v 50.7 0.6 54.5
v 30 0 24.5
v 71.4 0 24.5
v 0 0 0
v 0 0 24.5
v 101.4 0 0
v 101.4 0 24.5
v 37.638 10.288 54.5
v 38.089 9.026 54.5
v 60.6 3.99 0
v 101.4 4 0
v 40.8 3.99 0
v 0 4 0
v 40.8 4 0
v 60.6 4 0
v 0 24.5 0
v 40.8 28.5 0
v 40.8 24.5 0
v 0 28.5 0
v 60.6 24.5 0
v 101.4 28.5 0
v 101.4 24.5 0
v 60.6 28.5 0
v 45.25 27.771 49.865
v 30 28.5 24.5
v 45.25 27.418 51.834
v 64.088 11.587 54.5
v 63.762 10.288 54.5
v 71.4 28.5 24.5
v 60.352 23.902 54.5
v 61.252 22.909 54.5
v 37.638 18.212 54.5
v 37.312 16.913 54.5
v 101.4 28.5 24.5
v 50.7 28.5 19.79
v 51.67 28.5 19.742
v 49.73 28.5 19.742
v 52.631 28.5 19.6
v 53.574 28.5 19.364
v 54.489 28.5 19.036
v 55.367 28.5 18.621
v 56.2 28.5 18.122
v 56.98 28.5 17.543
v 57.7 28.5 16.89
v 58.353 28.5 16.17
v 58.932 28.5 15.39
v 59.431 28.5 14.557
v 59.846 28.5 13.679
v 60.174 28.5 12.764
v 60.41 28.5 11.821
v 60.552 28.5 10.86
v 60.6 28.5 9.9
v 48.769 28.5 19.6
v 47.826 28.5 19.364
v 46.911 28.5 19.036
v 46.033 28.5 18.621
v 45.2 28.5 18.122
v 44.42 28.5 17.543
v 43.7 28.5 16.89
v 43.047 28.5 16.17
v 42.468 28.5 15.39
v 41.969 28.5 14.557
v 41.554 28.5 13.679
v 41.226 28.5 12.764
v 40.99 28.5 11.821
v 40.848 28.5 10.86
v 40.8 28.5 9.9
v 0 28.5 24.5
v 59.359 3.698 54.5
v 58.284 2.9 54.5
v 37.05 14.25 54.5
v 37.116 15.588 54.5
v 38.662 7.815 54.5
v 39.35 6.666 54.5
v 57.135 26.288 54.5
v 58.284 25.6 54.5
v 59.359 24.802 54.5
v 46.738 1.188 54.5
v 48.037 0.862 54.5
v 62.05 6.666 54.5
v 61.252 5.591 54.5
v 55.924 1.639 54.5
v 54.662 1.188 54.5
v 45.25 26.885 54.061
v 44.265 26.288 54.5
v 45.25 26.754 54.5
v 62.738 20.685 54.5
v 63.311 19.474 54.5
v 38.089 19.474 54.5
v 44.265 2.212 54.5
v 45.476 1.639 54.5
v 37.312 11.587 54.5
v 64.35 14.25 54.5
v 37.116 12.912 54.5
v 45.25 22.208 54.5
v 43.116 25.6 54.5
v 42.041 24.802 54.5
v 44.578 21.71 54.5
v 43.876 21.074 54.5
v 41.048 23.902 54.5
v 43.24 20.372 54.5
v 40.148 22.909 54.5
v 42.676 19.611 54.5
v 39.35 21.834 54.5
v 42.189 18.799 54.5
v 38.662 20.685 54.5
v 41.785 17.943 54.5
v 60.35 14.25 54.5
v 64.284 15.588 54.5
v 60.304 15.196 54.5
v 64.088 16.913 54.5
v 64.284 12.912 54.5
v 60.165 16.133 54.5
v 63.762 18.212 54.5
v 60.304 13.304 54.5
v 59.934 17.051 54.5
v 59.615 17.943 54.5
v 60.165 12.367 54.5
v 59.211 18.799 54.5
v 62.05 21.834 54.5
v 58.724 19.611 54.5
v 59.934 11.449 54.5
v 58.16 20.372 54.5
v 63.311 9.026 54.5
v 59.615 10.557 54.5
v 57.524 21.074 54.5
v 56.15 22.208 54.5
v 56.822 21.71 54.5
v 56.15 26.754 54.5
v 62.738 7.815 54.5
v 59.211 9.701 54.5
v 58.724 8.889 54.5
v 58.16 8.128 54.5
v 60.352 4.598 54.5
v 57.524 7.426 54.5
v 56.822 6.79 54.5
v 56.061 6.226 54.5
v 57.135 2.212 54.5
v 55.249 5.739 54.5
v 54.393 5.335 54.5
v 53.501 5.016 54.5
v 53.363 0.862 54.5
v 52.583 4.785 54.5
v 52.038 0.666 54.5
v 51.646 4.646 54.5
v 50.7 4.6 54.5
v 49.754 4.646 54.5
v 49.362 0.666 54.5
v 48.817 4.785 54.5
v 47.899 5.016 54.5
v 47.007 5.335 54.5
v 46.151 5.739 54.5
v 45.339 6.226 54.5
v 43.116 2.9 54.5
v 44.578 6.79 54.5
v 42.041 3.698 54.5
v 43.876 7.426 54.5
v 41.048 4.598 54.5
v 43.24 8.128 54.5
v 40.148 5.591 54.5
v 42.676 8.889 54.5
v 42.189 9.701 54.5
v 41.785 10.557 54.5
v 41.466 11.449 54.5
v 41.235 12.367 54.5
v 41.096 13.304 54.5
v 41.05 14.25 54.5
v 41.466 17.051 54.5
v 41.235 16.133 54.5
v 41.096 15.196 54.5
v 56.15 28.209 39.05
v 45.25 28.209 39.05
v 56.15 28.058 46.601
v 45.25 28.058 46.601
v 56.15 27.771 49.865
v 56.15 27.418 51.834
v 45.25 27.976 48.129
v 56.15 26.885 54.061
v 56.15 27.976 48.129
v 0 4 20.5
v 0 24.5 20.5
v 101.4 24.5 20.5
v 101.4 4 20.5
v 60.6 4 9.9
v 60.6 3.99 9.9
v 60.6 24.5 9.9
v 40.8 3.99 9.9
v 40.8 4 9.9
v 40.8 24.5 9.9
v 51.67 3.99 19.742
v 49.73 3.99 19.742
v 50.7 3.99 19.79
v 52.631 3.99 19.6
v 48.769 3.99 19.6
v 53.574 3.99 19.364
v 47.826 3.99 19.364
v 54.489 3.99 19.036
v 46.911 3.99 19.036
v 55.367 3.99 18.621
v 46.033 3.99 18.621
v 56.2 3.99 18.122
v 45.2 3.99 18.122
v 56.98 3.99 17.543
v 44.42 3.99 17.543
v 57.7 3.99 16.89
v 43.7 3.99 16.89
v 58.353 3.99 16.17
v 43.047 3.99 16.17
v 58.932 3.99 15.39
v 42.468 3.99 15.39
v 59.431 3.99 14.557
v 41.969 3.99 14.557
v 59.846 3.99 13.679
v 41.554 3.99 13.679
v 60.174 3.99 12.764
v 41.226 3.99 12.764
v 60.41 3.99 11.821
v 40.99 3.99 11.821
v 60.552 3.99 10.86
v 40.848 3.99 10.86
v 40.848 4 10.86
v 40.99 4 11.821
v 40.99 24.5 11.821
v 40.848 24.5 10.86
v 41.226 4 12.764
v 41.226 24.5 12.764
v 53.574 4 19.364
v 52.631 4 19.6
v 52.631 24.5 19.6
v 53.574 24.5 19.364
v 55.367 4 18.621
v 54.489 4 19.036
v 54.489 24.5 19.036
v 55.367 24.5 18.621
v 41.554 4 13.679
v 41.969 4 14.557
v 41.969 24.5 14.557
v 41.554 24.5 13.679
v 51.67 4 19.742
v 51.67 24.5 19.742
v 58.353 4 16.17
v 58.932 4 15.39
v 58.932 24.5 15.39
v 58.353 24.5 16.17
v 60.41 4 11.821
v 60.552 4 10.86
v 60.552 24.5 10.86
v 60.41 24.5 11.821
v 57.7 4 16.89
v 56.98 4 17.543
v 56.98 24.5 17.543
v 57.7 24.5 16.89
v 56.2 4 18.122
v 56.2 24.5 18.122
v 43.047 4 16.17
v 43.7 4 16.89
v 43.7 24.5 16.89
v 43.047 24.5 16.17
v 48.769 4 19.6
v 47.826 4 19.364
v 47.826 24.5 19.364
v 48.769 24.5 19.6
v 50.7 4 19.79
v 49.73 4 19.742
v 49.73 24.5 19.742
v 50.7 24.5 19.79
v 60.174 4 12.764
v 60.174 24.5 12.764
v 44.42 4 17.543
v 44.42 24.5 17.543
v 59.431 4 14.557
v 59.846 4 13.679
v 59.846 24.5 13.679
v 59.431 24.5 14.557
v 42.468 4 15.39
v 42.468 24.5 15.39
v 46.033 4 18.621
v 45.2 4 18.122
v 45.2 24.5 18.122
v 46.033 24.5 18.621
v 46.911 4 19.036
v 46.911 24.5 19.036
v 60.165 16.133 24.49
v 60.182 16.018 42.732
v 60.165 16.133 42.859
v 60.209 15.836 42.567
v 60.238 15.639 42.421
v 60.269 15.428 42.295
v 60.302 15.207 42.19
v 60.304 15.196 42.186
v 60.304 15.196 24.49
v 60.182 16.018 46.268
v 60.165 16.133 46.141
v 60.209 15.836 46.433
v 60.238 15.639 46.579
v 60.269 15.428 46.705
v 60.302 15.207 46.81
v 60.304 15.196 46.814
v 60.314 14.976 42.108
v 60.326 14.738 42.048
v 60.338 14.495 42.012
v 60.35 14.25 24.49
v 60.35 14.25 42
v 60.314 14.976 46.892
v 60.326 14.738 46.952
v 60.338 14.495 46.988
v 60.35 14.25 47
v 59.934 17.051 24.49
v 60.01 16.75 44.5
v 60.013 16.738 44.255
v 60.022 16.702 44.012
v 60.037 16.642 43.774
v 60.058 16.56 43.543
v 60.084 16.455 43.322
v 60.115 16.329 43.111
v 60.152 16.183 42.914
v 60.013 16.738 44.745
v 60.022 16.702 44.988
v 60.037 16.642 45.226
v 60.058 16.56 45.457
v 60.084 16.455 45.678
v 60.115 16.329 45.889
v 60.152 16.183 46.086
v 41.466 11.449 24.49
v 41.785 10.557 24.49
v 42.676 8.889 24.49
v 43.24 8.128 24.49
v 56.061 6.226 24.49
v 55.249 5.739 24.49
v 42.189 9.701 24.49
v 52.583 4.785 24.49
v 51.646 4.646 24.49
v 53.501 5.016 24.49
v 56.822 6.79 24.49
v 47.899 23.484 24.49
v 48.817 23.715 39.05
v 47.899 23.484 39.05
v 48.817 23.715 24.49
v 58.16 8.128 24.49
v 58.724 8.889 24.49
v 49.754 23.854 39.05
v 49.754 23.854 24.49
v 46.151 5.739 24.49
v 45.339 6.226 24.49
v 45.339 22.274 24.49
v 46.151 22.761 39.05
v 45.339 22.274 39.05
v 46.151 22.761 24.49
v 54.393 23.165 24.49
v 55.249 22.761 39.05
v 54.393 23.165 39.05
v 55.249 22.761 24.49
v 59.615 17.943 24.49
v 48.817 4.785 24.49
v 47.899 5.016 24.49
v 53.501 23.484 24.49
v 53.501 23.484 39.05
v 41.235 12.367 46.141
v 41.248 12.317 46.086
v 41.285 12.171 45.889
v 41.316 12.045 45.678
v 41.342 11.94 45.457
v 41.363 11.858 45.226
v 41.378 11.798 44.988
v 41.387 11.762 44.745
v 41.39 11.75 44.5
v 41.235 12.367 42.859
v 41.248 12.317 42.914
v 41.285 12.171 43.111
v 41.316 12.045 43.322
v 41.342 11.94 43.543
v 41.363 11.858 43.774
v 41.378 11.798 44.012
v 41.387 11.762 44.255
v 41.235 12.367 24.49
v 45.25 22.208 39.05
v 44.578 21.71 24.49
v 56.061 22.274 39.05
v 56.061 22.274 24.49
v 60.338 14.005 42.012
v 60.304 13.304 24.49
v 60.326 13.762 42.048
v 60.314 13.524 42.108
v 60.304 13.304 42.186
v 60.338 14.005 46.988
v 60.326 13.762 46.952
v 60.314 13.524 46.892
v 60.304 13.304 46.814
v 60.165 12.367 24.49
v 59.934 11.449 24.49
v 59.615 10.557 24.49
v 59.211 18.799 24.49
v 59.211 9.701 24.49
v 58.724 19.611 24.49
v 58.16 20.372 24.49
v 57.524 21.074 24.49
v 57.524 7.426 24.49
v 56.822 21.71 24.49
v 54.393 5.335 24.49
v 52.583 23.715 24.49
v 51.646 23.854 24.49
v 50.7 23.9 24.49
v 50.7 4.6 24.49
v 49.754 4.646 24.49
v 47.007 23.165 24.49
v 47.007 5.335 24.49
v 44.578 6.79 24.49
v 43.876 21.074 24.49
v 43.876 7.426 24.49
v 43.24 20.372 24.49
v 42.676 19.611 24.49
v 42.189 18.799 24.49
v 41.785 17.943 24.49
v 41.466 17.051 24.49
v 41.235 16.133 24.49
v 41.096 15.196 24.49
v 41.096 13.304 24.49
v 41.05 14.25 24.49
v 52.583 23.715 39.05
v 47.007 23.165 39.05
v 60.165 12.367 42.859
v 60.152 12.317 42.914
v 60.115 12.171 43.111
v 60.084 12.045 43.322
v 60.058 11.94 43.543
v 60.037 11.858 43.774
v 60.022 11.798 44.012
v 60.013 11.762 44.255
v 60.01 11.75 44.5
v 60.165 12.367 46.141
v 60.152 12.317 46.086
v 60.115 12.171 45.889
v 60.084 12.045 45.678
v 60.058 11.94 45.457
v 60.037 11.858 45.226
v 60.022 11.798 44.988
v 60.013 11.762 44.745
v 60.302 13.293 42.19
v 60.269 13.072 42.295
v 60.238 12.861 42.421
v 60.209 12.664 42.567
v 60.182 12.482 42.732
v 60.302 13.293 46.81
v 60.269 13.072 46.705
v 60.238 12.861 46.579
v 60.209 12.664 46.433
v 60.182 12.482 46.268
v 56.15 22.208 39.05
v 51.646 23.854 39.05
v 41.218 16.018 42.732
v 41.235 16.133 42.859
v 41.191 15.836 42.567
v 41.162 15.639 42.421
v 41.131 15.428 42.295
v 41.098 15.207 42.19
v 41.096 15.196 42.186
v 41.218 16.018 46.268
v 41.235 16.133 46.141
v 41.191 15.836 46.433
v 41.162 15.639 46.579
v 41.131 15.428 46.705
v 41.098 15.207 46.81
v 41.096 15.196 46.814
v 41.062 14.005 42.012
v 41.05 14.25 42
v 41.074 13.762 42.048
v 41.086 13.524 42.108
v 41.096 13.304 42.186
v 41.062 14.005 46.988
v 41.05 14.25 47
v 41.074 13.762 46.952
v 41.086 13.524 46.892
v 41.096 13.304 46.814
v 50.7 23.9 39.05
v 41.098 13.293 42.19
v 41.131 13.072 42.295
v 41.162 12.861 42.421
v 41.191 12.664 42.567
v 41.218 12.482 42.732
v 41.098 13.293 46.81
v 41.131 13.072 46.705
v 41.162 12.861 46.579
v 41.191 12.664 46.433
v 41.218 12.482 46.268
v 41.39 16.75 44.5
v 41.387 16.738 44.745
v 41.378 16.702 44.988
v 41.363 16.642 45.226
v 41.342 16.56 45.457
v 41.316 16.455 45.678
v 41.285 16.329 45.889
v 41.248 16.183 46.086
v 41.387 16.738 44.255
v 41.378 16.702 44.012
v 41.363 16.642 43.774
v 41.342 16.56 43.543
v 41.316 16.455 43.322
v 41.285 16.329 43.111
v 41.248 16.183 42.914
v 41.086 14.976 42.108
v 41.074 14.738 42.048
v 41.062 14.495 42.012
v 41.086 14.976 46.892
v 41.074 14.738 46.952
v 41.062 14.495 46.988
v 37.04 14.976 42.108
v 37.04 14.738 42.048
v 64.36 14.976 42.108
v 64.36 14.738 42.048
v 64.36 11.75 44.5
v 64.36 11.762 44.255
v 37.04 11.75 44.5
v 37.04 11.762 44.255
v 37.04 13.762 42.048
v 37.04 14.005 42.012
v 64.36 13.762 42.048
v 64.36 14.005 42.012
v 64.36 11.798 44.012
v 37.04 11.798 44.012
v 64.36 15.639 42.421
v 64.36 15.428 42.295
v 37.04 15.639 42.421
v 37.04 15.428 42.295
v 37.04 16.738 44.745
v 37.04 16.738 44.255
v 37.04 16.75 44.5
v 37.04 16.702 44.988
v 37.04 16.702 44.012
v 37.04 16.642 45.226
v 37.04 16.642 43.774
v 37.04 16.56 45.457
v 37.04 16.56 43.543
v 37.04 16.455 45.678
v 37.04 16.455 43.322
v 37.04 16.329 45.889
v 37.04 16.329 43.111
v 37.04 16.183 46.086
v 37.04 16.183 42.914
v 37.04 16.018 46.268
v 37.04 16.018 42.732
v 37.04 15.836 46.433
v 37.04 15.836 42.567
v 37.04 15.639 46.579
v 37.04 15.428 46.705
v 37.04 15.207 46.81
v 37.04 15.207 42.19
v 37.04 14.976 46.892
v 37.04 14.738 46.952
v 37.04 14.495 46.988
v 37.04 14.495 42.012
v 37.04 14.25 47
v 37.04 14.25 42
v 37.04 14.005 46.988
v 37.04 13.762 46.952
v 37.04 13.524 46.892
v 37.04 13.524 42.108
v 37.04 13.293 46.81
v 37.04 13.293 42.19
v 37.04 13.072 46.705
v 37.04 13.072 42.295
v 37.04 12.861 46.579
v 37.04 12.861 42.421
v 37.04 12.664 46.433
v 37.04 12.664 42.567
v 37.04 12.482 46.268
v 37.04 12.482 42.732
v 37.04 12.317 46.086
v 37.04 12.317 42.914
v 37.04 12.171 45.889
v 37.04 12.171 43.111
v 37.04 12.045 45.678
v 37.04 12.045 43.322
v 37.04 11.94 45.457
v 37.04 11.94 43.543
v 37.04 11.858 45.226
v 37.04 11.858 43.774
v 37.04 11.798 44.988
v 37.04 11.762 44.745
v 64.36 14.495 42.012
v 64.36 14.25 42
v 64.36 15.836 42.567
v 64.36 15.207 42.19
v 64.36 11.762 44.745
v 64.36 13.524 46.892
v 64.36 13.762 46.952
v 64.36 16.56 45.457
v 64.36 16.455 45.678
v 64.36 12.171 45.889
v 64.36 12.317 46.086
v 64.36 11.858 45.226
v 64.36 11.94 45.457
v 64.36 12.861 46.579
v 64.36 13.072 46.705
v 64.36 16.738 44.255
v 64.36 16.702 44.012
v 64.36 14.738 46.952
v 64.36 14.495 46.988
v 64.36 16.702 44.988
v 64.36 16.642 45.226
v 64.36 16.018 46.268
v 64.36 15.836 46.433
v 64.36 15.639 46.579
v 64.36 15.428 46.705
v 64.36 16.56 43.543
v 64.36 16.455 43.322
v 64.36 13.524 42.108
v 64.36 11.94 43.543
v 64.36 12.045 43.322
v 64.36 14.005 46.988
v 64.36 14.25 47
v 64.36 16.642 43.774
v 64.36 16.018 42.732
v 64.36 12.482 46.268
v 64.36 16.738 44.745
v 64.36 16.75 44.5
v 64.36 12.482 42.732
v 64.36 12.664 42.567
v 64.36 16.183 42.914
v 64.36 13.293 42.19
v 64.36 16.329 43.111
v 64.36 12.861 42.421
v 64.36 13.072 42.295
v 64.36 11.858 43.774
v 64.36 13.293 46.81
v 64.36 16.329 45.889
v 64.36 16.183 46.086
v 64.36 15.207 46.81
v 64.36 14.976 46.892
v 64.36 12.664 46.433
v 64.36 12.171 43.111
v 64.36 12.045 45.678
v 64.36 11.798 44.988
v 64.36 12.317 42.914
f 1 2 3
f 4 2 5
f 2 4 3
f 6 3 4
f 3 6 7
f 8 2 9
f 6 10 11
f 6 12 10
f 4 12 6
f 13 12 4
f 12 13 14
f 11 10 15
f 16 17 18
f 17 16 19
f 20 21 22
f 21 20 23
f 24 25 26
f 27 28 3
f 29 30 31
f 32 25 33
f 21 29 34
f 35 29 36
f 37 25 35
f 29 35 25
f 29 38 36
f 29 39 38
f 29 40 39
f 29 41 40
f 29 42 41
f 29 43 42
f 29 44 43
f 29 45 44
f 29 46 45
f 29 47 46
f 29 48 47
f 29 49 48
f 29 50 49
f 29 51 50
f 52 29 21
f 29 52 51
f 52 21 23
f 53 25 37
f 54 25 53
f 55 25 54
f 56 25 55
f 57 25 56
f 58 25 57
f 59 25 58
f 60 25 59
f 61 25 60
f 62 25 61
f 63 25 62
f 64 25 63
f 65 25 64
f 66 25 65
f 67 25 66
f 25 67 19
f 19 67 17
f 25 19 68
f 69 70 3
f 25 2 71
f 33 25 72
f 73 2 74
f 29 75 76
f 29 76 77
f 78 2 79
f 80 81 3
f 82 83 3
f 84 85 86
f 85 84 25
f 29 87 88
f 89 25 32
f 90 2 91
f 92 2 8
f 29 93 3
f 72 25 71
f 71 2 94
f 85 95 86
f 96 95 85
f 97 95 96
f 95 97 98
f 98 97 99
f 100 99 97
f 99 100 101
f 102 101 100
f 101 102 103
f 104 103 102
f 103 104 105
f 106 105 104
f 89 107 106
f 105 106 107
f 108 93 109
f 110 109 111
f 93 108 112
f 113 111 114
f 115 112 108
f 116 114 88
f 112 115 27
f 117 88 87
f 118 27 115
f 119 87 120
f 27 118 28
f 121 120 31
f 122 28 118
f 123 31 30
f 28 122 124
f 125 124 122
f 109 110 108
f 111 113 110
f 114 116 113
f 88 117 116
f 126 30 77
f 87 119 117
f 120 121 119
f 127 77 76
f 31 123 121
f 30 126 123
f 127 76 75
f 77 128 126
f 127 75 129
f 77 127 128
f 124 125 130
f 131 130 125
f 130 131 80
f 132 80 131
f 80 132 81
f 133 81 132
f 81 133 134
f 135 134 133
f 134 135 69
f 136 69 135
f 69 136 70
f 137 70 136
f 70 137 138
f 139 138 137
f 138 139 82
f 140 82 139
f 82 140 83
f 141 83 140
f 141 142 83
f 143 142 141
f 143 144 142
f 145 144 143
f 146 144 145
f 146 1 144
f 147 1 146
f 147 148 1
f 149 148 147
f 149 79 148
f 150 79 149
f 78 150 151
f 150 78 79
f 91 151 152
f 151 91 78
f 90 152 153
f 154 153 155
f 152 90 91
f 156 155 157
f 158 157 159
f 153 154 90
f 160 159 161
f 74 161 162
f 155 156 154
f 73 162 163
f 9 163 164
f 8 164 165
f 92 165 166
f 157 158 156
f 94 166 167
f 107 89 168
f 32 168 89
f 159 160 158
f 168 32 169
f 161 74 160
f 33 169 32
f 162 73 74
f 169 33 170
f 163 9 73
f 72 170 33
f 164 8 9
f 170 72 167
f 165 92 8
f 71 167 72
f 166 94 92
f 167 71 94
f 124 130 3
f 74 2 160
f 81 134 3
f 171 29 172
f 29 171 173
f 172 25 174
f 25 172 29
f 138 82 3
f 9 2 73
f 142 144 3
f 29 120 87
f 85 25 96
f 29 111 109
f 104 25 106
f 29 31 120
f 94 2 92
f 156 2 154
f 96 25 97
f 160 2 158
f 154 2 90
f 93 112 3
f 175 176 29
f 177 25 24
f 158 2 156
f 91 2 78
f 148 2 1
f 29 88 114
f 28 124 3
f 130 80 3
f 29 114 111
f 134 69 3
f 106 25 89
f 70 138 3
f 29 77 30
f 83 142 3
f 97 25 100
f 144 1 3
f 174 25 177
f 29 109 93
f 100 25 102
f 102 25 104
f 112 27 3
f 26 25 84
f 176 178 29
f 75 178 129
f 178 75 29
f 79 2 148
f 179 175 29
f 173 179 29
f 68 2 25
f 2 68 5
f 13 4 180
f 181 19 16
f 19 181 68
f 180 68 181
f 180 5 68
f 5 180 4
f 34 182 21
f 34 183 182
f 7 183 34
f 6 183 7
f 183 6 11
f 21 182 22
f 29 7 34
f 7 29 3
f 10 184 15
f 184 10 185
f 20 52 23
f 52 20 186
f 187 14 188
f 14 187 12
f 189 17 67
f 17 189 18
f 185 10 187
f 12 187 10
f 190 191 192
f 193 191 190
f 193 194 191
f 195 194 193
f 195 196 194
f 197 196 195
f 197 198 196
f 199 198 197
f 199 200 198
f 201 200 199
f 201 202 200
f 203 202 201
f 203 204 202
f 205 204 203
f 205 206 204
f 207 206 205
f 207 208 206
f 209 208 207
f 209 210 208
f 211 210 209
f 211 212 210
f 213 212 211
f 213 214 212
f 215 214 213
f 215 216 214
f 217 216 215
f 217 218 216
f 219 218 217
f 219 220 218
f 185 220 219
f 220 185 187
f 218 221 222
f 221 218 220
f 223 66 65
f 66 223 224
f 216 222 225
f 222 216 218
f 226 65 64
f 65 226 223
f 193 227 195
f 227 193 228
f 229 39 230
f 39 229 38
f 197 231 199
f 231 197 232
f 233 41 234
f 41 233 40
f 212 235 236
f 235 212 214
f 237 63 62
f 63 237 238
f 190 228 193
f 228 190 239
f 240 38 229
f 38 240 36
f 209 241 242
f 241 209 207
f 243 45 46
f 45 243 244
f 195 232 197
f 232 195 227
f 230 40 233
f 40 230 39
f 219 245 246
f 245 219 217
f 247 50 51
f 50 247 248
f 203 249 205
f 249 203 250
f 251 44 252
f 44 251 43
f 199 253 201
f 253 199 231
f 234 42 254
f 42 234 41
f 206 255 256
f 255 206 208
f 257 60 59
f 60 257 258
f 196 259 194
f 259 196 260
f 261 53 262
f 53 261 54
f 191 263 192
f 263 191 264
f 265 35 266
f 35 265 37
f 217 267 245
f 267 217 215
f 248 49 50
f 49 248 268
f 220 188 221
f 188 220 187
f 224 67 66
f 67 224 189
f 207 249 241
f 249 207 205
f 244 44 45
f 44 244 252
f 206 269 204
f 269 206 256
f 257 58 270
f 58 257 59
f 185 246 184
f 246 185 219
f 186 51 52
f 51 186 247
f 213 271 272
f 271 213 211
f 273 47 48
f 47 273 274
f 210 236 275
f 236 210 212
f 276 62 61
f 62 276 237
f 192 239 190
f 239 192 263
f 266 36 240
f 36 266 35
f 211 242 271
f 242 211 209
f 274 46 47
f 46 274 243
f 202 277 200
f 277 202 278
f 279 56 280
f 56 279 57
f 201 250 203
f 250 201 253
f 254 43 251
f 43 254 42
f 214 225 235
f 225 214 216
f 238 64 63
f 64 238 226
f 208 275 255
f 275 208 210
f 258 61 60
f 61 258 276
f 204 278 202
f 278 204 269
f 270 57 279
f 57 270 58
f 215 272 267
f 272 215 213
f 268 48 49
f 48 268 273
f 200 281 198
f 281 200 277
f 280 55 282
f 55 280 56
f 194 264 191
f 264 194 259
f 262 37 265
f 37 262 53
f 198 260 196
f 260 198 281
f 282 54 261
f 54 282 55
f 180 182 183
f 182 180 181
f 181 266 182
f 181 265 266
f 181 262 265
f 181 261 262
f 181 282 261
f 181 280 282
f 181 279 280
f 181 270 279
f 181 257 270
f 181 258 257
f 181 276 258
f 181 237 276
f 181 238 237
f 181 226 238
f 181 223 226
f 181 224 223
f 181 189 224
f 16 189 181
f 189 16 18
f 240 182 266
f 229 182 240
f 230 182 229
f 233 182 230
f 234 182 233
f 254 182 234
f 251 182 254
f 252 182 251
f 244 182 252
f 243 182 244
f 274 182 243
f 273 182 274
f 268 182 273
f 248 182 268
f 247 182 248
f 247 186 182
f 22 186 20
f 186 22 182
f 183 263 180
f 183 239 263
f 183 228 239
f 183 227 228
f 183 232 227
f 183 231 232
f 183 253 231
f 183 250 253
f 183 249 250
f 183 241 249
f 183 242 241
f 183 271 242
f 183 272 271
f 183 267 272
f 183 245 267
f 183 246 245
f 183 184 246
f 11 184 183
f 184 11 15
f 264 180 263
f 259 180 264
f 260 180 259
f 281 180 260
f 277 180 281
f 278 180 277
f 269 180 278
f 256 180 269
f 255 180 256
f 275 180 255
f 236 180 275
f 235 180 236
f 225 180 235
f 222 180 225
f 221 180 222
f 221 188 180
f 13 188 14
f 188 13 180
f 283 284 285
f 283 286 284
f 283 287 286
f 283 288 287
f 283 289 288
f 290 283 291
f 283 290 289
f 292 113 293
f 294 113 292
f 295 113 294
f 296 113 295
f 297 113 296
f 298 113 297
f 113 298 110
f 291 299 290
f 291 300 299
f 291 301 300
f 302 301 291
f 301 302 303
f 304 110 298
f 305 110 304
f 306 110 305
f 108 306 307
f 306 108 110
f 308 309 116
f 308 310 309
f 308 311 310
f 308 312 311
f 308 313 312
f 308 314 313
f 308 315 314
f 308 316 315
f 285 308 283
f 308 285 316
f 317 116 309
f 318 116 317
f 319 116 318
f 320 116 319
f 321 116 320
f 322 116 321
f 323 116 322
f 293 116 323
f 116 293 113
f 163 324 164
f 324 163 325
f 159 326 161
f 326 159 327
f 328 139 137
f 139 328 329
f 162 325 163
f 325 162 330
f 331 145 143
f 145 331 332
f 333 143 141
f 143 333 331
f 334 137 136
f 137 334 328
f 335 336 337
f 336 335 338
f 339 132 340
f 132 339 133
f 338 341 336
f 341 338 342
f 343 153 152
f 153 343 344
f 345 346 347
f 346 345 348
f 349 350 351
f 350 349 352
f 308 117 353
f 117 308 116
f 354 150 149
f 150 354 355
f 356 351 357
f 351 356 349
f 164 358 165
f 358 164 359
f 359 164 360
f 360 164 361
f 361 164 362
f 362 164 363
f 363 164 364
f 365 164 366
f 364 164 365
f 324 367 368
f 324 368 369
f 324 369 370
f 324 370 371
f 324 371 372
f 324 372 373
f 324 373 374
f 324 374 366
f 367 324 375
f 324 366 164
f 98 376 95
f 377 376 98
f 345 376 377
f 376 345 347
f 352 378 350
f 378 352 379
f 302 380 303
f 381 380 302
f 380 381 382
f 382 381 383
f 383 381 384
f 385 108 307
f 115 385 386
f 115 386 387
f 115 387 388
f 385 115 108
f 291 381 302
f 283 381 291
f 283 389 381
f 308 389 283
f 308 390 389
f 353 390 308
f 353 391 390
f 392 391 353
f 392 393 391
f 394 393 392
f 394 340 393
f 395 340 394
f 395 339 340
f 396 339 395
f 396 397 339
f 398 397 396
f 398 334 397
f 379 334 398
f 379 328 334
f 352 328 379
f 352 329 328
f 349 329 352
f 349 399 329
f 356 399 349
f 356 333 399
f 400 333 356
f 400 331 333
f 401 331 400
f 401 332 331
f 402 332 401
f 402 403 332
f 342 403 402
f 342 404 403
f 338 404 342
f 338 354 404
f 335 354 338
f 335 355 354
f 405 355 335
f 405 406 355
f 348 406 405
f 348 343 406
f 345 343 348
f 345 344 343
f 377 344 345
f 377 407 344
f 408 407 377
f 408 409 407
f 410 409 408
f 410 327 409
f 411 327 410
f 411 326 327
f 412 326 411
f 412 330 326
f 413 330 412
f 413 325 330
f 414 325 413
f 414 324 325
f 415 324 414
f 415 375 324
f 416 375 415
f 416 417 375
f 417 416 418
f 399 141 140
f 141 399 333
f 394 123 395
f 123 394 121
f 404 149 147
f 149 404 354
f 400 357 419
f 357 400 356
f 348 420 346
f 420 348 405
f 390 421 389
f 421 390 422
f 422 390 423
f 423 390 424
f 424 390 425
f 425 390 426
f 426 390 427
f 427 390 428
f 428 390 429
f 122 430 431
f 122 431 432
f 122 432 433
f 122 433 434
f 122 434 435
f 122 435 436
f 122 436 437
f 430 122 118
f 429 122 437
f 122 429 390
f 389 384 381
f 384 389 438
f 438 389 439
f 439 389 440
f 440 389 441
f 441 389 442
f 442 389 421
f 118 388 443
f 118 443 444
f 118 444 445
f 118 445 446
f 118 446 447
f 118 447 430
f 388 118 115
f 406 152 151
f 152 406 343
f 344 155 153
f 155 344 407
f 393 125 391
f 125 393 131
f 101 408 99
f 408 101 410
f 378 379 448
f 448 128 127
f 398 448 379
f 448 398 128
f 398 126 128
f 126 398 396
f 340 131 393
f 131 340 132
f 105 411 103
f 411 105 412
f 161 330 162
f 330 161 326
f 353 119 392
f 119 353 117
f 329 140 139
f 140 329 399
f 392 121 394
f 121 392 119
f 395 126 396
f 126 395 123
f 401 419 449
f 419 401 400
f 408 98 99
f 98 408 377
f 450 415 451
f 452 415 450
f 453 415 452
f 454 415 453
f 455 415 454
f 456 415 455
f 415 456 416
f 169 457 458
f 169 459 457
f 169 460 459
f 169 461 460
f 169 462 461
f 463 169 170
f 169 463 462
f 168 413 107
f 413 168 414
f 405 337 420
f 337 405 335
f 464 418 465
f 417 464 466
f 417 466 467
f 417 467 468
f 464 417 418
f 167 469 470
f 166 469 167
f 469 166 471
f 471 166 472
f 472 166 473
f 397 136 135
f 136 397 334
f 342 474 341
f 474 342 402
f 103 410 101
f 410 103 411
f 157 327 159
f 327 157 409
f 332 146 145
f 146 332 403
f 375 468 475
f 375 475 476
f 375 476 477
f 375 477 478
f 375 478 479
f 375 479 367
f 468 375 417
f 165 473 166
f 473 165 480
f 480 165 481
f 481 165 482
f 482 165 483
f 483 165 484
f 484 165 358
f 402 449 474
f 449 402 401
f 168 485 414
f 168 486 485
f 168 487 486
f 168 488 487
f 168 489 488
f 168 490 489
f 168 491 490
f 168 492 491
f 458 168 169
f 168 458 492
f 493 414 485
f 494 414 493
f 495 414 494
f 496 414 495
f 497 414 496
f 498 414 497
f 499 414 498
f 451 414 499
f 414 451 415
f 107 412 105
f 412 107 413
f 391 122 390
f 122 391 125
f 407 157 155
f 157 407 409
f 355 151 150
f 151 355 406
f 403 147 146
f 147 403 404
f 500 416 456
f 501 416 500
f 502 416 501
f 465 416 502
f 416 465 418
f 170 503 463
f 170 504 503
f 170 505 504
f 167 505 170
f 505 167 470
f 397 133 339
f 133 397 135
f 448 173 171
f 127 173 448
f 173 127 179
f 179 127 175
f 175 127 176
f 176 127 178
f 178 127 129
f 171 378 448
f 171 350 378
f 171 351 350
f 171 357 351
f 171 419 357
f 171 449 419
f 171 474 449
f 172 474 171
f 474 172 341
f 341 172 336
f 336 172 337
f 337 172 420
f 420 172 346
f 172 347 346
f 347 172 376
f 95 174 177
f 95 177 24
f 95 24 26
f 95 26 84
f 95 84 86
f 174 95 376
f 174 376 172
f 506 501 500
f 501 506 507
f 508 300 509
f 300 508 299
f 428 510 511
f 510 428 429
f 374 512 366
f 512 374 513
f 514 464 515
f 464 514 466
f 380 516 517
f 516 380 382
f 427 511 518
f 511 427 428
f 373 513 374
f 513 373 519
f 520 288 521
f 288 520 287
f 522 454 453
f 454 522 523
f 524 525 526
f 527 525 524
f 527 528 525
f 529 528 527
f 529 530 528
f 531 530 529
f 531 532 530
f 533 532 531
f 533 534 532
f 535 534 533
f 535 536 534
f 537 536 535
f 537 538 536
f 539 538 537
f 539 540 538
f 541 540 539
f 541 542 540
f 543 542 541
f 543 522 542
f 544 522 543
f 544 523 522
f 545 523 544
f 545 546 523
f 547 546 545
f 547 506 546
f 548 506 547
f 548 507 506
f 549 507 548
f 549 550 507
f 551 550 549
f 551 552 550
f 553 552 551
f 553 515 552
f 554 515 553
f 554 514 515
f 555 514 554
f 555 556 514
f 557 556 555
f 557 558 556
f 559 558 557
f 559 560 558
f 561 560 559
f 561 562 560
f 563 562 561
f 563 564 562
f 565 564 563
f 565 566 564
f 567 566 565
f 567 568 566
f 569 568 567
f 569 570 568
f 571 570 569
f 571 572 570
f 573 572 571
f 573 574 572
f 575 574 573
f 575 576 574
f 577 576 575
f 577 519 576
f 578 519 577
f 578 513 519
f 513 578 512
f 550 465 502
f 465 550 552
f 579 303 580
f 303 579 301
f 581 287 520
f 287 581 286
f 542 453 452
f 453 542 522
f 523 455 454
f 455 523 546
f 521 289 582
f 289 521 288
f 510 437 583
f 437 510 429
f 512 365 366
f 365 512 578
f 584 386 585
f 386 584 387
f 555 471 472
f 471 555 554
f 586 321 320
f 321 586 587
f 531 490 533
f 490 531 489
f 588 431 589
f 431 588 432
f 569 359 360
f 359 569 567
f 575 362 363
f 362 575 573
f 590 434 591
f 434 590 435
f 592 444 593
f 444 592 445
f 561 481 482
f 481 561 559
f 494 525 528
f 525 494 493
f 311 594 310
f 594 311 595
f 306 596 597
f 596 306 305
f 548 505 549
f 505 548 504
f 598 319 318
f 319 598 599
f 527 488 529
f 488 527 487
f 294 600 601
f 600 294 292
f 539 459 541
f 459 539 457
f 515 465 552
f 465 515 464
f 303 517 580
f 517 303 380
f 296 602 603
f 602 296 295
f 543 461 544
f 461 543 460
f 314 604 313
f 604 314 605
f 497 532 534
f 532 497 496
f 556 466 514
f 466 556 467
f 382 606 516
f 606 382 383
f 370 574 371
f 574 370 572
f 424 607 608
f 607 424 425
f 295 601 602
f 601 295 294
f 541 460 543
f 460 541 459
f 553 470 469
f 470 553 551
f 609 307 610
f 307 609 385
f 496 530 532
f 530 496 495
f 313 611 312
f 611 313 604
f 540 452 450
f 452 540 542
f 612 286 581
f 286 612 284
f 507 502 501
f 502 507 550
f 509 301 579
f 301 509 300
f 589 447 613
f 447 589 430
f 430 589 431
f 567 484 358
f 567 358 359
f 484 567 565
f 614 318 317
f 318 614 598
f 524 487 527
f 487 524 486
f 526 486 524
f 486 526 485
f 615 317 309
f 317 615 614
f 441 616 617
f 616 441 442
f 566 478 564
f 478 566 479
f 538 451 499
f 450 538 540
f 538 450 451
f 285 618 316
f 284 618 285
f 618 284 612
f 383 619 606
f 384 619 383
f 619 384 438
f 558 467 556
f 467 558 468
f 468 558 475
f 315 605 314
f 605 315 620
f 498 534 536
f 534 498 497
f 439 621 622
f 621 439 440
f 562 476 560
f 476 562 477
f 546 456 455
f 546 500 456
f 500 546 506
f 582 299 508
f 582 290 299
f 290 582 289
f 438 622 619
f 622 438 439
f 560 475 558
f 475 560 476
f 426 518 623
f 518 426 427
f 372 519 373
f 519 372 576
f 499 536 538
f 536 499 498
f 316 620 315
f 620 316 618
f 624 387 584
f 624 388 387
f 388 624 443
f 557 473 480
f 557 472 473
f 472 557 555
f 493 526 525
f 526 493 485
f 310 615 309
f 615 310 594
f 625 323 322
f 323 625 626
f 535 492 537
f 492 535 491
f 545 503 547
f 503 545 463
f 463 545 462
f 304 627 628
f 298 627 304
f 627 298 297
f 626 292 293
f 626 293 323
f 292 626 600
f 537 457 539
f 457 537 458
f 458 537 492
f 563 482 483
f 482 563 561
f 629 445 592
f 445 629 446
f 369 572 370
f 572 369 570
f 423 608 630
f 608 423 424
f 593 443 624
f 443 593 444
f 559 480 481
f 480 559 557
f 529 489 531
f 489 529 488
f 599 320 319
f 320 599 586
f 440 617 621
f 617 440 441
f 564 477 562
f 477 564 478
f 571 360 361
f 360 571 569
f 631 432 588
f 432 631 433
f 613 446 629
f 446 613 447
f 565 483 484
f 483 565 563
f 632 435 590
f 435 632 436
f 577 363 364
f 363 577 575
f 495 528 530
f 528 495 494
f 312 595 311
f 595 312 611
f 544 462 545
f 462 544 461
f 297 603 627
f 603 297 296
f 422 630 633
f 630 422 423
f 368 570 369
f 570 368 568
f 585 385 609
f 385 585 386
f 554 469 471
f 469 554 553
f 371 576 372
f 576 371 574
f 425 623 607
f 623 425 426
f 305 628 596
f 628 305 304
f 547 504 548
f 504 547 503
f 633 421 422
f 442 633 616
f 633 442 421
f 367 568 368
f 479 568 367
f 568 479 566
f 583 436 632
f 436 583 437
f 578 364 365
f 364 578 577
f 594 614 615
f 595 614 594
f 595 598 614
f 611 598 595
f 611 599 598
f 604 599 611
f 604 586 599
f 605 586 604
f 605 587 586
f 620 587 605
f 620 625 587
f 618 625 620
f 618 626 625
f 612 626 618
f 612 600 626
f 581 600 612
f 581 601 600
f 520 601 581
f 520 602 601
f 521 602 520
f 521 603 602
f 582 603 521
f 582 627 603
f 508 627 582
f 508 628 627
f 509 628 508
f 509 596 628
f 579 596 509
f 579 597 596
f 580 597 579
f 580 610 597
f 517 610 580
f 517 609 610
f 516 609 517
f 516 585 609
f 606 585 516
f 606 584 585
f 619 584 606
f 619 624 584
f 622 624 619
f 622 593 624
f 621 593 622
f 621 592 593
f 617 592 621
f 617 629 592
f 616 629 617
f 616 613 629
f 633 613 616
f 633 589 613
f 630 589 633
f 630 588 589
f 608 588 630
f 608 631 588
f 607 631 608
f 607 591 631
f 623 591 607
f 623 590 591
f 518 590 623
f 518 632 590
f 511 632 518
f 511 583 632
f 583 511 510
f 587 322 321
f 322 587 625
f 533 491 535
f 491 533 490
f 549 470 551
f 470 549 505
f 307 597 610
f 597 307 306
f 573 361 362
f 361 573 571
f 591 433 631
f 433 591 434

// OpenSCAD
// file: ../lib/common.scad
// ─── common.scad ─────────────────────────────────────────────────────────────
// Shared utility modules for the 3D model project.
// Include with:  include <../lib/common.scad>
// ─────────────────────────────────────────────────────────────────────────────

$fn = 64; // global circle/sphere smoothness

// ── Rounded box ──────────────────────────────────────────────────────────────
// w/d/h = outer dimensions, r = corner radius
module rounded_box(w, d, h, r = 2) {
    hull() {
        for (x = [r, w - r])
        for (y = [r, d - r])
            translate([x, y, 0])
                cylinder(r = r, h = h);
    }
}

// ── Rounded box with optional hollow interior ─────────────────────────────────
// wall = wall thickness; set to 0 for a solid block
module box_shell(w, d, h, r = 2, wall = 1.5) {
    if (wall <= 0) {
        rounded_box(w, d, h, r);
    } else {
        difference() {
            rounded_box(w, d, h, r);
            translate([wall, wall, wall])
                rounded_box(w - wall*2, d - wall*2, h, max(r - wall, 0.1));
        }
    }
}

// ── Countersunk hole (for M-series screws) ────────────────────────────────────
// d_shaft = shaft diameter, d_head = countersink diameter, depth = head depth
module countersink(d_shaft, d_head, depth, h_total) {
    union() {
        cylinder(d = d_shaft, h = h_total);
        cylinder(d1 = d_head, d2 = d_shaft, h = depth);
    }
}

// ── Slot (oblong hole) ────────────────────────────────────────────────────────
// len = total length along X, w = width, h = depth
module slot(len, w, h) {
    r = w / 2;
    hull() {
        translate([r, 0, 0]) cylinder(r = r, h = h);
        translate([len - r, 0, 0]) cylinder(r = r, h = h);
    }
}

// ── Snap-fit clip (cantilever, +X direction) ─────────────────────────────────
// arm_l/w/h = arm dimensions, tip_h = tip protrusion
module snap_clip(arm_l = 10, arm_w = 4, arm_h = 1.5, tip_h = 1) {
    cube([arm_l, arm_w, arm_h]);
    translate([arm_l - tip_h, 0, arm_h])
        cube([tip_h, arm_w, tip_h]);
}

// ── Text label (recessed) ─────────────────────────────────────────────────────
// Use inside a difference(). t = text string, s = font size, depth = recess
module label(t, s = 5, depth = 0.5) {
    linear_extrude(depth)
        text(t, size = s, halign = "center", valign = "center");
}
// main file
// ─── tube_support_clamp.scad ──────────────────────────────────────────────────
// Saddle bracket that presses DOWN onto a square bar (lying flat, running in X).
// Round tube socket rises from the top centre.
// Coordinate convention matches the bar:
//   X = along bar length (bracket straddles this)
//   Y = bar depth  (20.7 mm)
//   Z = bar height (20.7 mm) — bracket presses down over this
//
// Print orientation: upside-down (socket pointing at build plate).
// ─────────────────────────────────────────────────────────────────────────────

include <../lib/common.scad>

// ── Parameters ────────────────────────────────────────────────────────────────

WALL = 4;                    // wall thickness (mm)

// Square bar cross-section  — -0.2 mm interference on each bore dimension
BAR_Y          = 20.7;       // bar depth  (Y)
BAR_Z          = 20.7;       // bar height (Z)
BORE_Y         = BAR_Y - 0.2;
BORE_Z         = BAR_Z - 0.2;

// Central hull width (socket diameter + walls each side)
GRIP_X         = BAR_Y * 2;  // core width around socket
// Wing extensions — extra grip length on each X side beyond the core
WING_X         = 30;

// Round vertical tube — -0.2 mm interference press fit
TUBE_OD        = 19.5;
TUBE_BORE      = TUBE_OD - 0.2;
SOCKET_DEPTH   = 30;         // insertion depth of round tube

// Squared nut (inside round socket, locks tube)
NUT_W          = 10.3;
NUT_THICK      = 5;
NUT_FROM_FLOOR = 20;         // distance from socket floor to nut centre
NUT_SLOT_W     = NUT_W + 0.6;
NUT_SLOT_T     = NUT_THICK + 0.4;

// Wing screw shaft clearance
SCREW_D        = 5;

// ── Derived ───────────────────────────────────────────────────────────────────

// Core saddle (around socket)
SADDLE_X  = GRIP_X;
SADDLE_Y  = BORE_Y + WALL * 2;
SADDLE_Z  = BORE_Z + WALL;       // WALL roof + bar height (open at bottom)

// Full width including wings
TOTAL_X   = SADDLE_X + WING_X * 2;

SOCKET_OD = TUBE_BORE + WALL * 2;

// Socket centre — offset by WING_X so it stays centred on TOTAL_X
CX = WING_X + SADDLE_X / 2;
CY = SADDLE_Y / 2;

// ── Body — central hull + flat wings on each X side ───────────────────────────
module body() {
    union() {
        // central hull: tapers from core saddle block up to socket cylinder
        translate([WING_X, 0, 0])
            hull() {
                cube([SADDLE_X, SADDLE_Y, SADDLE_Z]);
                translate([SADDLE_X / 2, CY, SADDLE_Z])
                    cylinder(d = SOCKET_OD, h = SOCKET_DEPTH);
            }
        // left wing — flat saddle slab, same Y and Z as core
        cube([WING_X, SADDLE_Y, SADDLE_Z]);
        // right wing
        translate([WING_X + SADDLE_X, 0, 0])
            cube([WING_X, SADDLE_Y, SADDLE_Z]);
    }
}

// ── Bar channel — U-slot spanning full width including wings ──────────────────
module bar_channel() {
    translate([-0.01, WALL, -0.01])
        cube([TOTAL_X + 0.02, BORE_Y, BORE_Z + 0.01]);
}

// ── Front tube opening — arch slot through front wall only ────────────────────
// Starts at Y=WALL (inner face of front wall) and exits at Y=SADDLE_Y (outer face).
// Leaves the back wall (Y=0 to Y=WALL) intact.
// Open at Z=0 so the tube slides in from below.
module front_tube_opening() {
    tube_r = (TUBE_OD + 0.3) / 2;
    // cut depth = from inner face of front wall to outside
    cut_depth = SADDLE_Y - WALL + 0.02;
    translate([CX, WALL - 0.01, -0.01]) {
        // rectangular stem from bottom up to arch start
        translate([-tube_r, 0, 0])
            cube([tube_r * 2, cut_depth, tube_r + 0.01]);
        // arched top
        translate([0, 0, tube_r])
            rotate([-90, 0, 0])
                cylinder(r = tube_r, h = cut_depth);
    }
}

// ── Round tube socket bore ────────────────────────────────────────────────────
module round_bore() {
    translate([CX, CY, SADDLE_Z - 0.01])
        cylinder(d = TUBE_BORE, h = SOCKET_DEPTH + 0.02);
}

// ── Nut slot — from socket top down to nut position ───────────────────────────
// Tube and nut insert from above; slot gives clearance from top to nut centre.
module nut_slot() {
    slot_bottom = SADDLE_Z + NUT_FROM_FLOOR - NUT_SLOT_W / 2;
    slot_top    = SADDLE_Z + SOCKET_DEPTH + 0.02;
    translate([CX - NUT_SLOT_W / 2, CY - NUT_SLOT_T / 2, slot_bottom])
        cube([NUT_SLOT_W, SOCKET_OD, slot_top - slot_bottom]);
}

// ── Wing screw bore — only through socket cylinder walls at nut height ─────────
module screw_bore() {
    // limited to SOCKET_OD width so it doesn't exit through the taper
    translate([CX - SOCKET_OD / 2 - 0.01, CY, SADDLE_Z + NUT_FROM_FLOOR])
        rotate([0, 90, 0])
            cylinder(d = SCREW_D, h = SOCKET_OD + 0.02);
}

// ── Assembly ──────────────────────────────────────────────────────────────────
difference() {
    body();
    bar_channel();
    front_tube_opening();
    round_bore();
    nut_slot();
    screw_bore();
}
